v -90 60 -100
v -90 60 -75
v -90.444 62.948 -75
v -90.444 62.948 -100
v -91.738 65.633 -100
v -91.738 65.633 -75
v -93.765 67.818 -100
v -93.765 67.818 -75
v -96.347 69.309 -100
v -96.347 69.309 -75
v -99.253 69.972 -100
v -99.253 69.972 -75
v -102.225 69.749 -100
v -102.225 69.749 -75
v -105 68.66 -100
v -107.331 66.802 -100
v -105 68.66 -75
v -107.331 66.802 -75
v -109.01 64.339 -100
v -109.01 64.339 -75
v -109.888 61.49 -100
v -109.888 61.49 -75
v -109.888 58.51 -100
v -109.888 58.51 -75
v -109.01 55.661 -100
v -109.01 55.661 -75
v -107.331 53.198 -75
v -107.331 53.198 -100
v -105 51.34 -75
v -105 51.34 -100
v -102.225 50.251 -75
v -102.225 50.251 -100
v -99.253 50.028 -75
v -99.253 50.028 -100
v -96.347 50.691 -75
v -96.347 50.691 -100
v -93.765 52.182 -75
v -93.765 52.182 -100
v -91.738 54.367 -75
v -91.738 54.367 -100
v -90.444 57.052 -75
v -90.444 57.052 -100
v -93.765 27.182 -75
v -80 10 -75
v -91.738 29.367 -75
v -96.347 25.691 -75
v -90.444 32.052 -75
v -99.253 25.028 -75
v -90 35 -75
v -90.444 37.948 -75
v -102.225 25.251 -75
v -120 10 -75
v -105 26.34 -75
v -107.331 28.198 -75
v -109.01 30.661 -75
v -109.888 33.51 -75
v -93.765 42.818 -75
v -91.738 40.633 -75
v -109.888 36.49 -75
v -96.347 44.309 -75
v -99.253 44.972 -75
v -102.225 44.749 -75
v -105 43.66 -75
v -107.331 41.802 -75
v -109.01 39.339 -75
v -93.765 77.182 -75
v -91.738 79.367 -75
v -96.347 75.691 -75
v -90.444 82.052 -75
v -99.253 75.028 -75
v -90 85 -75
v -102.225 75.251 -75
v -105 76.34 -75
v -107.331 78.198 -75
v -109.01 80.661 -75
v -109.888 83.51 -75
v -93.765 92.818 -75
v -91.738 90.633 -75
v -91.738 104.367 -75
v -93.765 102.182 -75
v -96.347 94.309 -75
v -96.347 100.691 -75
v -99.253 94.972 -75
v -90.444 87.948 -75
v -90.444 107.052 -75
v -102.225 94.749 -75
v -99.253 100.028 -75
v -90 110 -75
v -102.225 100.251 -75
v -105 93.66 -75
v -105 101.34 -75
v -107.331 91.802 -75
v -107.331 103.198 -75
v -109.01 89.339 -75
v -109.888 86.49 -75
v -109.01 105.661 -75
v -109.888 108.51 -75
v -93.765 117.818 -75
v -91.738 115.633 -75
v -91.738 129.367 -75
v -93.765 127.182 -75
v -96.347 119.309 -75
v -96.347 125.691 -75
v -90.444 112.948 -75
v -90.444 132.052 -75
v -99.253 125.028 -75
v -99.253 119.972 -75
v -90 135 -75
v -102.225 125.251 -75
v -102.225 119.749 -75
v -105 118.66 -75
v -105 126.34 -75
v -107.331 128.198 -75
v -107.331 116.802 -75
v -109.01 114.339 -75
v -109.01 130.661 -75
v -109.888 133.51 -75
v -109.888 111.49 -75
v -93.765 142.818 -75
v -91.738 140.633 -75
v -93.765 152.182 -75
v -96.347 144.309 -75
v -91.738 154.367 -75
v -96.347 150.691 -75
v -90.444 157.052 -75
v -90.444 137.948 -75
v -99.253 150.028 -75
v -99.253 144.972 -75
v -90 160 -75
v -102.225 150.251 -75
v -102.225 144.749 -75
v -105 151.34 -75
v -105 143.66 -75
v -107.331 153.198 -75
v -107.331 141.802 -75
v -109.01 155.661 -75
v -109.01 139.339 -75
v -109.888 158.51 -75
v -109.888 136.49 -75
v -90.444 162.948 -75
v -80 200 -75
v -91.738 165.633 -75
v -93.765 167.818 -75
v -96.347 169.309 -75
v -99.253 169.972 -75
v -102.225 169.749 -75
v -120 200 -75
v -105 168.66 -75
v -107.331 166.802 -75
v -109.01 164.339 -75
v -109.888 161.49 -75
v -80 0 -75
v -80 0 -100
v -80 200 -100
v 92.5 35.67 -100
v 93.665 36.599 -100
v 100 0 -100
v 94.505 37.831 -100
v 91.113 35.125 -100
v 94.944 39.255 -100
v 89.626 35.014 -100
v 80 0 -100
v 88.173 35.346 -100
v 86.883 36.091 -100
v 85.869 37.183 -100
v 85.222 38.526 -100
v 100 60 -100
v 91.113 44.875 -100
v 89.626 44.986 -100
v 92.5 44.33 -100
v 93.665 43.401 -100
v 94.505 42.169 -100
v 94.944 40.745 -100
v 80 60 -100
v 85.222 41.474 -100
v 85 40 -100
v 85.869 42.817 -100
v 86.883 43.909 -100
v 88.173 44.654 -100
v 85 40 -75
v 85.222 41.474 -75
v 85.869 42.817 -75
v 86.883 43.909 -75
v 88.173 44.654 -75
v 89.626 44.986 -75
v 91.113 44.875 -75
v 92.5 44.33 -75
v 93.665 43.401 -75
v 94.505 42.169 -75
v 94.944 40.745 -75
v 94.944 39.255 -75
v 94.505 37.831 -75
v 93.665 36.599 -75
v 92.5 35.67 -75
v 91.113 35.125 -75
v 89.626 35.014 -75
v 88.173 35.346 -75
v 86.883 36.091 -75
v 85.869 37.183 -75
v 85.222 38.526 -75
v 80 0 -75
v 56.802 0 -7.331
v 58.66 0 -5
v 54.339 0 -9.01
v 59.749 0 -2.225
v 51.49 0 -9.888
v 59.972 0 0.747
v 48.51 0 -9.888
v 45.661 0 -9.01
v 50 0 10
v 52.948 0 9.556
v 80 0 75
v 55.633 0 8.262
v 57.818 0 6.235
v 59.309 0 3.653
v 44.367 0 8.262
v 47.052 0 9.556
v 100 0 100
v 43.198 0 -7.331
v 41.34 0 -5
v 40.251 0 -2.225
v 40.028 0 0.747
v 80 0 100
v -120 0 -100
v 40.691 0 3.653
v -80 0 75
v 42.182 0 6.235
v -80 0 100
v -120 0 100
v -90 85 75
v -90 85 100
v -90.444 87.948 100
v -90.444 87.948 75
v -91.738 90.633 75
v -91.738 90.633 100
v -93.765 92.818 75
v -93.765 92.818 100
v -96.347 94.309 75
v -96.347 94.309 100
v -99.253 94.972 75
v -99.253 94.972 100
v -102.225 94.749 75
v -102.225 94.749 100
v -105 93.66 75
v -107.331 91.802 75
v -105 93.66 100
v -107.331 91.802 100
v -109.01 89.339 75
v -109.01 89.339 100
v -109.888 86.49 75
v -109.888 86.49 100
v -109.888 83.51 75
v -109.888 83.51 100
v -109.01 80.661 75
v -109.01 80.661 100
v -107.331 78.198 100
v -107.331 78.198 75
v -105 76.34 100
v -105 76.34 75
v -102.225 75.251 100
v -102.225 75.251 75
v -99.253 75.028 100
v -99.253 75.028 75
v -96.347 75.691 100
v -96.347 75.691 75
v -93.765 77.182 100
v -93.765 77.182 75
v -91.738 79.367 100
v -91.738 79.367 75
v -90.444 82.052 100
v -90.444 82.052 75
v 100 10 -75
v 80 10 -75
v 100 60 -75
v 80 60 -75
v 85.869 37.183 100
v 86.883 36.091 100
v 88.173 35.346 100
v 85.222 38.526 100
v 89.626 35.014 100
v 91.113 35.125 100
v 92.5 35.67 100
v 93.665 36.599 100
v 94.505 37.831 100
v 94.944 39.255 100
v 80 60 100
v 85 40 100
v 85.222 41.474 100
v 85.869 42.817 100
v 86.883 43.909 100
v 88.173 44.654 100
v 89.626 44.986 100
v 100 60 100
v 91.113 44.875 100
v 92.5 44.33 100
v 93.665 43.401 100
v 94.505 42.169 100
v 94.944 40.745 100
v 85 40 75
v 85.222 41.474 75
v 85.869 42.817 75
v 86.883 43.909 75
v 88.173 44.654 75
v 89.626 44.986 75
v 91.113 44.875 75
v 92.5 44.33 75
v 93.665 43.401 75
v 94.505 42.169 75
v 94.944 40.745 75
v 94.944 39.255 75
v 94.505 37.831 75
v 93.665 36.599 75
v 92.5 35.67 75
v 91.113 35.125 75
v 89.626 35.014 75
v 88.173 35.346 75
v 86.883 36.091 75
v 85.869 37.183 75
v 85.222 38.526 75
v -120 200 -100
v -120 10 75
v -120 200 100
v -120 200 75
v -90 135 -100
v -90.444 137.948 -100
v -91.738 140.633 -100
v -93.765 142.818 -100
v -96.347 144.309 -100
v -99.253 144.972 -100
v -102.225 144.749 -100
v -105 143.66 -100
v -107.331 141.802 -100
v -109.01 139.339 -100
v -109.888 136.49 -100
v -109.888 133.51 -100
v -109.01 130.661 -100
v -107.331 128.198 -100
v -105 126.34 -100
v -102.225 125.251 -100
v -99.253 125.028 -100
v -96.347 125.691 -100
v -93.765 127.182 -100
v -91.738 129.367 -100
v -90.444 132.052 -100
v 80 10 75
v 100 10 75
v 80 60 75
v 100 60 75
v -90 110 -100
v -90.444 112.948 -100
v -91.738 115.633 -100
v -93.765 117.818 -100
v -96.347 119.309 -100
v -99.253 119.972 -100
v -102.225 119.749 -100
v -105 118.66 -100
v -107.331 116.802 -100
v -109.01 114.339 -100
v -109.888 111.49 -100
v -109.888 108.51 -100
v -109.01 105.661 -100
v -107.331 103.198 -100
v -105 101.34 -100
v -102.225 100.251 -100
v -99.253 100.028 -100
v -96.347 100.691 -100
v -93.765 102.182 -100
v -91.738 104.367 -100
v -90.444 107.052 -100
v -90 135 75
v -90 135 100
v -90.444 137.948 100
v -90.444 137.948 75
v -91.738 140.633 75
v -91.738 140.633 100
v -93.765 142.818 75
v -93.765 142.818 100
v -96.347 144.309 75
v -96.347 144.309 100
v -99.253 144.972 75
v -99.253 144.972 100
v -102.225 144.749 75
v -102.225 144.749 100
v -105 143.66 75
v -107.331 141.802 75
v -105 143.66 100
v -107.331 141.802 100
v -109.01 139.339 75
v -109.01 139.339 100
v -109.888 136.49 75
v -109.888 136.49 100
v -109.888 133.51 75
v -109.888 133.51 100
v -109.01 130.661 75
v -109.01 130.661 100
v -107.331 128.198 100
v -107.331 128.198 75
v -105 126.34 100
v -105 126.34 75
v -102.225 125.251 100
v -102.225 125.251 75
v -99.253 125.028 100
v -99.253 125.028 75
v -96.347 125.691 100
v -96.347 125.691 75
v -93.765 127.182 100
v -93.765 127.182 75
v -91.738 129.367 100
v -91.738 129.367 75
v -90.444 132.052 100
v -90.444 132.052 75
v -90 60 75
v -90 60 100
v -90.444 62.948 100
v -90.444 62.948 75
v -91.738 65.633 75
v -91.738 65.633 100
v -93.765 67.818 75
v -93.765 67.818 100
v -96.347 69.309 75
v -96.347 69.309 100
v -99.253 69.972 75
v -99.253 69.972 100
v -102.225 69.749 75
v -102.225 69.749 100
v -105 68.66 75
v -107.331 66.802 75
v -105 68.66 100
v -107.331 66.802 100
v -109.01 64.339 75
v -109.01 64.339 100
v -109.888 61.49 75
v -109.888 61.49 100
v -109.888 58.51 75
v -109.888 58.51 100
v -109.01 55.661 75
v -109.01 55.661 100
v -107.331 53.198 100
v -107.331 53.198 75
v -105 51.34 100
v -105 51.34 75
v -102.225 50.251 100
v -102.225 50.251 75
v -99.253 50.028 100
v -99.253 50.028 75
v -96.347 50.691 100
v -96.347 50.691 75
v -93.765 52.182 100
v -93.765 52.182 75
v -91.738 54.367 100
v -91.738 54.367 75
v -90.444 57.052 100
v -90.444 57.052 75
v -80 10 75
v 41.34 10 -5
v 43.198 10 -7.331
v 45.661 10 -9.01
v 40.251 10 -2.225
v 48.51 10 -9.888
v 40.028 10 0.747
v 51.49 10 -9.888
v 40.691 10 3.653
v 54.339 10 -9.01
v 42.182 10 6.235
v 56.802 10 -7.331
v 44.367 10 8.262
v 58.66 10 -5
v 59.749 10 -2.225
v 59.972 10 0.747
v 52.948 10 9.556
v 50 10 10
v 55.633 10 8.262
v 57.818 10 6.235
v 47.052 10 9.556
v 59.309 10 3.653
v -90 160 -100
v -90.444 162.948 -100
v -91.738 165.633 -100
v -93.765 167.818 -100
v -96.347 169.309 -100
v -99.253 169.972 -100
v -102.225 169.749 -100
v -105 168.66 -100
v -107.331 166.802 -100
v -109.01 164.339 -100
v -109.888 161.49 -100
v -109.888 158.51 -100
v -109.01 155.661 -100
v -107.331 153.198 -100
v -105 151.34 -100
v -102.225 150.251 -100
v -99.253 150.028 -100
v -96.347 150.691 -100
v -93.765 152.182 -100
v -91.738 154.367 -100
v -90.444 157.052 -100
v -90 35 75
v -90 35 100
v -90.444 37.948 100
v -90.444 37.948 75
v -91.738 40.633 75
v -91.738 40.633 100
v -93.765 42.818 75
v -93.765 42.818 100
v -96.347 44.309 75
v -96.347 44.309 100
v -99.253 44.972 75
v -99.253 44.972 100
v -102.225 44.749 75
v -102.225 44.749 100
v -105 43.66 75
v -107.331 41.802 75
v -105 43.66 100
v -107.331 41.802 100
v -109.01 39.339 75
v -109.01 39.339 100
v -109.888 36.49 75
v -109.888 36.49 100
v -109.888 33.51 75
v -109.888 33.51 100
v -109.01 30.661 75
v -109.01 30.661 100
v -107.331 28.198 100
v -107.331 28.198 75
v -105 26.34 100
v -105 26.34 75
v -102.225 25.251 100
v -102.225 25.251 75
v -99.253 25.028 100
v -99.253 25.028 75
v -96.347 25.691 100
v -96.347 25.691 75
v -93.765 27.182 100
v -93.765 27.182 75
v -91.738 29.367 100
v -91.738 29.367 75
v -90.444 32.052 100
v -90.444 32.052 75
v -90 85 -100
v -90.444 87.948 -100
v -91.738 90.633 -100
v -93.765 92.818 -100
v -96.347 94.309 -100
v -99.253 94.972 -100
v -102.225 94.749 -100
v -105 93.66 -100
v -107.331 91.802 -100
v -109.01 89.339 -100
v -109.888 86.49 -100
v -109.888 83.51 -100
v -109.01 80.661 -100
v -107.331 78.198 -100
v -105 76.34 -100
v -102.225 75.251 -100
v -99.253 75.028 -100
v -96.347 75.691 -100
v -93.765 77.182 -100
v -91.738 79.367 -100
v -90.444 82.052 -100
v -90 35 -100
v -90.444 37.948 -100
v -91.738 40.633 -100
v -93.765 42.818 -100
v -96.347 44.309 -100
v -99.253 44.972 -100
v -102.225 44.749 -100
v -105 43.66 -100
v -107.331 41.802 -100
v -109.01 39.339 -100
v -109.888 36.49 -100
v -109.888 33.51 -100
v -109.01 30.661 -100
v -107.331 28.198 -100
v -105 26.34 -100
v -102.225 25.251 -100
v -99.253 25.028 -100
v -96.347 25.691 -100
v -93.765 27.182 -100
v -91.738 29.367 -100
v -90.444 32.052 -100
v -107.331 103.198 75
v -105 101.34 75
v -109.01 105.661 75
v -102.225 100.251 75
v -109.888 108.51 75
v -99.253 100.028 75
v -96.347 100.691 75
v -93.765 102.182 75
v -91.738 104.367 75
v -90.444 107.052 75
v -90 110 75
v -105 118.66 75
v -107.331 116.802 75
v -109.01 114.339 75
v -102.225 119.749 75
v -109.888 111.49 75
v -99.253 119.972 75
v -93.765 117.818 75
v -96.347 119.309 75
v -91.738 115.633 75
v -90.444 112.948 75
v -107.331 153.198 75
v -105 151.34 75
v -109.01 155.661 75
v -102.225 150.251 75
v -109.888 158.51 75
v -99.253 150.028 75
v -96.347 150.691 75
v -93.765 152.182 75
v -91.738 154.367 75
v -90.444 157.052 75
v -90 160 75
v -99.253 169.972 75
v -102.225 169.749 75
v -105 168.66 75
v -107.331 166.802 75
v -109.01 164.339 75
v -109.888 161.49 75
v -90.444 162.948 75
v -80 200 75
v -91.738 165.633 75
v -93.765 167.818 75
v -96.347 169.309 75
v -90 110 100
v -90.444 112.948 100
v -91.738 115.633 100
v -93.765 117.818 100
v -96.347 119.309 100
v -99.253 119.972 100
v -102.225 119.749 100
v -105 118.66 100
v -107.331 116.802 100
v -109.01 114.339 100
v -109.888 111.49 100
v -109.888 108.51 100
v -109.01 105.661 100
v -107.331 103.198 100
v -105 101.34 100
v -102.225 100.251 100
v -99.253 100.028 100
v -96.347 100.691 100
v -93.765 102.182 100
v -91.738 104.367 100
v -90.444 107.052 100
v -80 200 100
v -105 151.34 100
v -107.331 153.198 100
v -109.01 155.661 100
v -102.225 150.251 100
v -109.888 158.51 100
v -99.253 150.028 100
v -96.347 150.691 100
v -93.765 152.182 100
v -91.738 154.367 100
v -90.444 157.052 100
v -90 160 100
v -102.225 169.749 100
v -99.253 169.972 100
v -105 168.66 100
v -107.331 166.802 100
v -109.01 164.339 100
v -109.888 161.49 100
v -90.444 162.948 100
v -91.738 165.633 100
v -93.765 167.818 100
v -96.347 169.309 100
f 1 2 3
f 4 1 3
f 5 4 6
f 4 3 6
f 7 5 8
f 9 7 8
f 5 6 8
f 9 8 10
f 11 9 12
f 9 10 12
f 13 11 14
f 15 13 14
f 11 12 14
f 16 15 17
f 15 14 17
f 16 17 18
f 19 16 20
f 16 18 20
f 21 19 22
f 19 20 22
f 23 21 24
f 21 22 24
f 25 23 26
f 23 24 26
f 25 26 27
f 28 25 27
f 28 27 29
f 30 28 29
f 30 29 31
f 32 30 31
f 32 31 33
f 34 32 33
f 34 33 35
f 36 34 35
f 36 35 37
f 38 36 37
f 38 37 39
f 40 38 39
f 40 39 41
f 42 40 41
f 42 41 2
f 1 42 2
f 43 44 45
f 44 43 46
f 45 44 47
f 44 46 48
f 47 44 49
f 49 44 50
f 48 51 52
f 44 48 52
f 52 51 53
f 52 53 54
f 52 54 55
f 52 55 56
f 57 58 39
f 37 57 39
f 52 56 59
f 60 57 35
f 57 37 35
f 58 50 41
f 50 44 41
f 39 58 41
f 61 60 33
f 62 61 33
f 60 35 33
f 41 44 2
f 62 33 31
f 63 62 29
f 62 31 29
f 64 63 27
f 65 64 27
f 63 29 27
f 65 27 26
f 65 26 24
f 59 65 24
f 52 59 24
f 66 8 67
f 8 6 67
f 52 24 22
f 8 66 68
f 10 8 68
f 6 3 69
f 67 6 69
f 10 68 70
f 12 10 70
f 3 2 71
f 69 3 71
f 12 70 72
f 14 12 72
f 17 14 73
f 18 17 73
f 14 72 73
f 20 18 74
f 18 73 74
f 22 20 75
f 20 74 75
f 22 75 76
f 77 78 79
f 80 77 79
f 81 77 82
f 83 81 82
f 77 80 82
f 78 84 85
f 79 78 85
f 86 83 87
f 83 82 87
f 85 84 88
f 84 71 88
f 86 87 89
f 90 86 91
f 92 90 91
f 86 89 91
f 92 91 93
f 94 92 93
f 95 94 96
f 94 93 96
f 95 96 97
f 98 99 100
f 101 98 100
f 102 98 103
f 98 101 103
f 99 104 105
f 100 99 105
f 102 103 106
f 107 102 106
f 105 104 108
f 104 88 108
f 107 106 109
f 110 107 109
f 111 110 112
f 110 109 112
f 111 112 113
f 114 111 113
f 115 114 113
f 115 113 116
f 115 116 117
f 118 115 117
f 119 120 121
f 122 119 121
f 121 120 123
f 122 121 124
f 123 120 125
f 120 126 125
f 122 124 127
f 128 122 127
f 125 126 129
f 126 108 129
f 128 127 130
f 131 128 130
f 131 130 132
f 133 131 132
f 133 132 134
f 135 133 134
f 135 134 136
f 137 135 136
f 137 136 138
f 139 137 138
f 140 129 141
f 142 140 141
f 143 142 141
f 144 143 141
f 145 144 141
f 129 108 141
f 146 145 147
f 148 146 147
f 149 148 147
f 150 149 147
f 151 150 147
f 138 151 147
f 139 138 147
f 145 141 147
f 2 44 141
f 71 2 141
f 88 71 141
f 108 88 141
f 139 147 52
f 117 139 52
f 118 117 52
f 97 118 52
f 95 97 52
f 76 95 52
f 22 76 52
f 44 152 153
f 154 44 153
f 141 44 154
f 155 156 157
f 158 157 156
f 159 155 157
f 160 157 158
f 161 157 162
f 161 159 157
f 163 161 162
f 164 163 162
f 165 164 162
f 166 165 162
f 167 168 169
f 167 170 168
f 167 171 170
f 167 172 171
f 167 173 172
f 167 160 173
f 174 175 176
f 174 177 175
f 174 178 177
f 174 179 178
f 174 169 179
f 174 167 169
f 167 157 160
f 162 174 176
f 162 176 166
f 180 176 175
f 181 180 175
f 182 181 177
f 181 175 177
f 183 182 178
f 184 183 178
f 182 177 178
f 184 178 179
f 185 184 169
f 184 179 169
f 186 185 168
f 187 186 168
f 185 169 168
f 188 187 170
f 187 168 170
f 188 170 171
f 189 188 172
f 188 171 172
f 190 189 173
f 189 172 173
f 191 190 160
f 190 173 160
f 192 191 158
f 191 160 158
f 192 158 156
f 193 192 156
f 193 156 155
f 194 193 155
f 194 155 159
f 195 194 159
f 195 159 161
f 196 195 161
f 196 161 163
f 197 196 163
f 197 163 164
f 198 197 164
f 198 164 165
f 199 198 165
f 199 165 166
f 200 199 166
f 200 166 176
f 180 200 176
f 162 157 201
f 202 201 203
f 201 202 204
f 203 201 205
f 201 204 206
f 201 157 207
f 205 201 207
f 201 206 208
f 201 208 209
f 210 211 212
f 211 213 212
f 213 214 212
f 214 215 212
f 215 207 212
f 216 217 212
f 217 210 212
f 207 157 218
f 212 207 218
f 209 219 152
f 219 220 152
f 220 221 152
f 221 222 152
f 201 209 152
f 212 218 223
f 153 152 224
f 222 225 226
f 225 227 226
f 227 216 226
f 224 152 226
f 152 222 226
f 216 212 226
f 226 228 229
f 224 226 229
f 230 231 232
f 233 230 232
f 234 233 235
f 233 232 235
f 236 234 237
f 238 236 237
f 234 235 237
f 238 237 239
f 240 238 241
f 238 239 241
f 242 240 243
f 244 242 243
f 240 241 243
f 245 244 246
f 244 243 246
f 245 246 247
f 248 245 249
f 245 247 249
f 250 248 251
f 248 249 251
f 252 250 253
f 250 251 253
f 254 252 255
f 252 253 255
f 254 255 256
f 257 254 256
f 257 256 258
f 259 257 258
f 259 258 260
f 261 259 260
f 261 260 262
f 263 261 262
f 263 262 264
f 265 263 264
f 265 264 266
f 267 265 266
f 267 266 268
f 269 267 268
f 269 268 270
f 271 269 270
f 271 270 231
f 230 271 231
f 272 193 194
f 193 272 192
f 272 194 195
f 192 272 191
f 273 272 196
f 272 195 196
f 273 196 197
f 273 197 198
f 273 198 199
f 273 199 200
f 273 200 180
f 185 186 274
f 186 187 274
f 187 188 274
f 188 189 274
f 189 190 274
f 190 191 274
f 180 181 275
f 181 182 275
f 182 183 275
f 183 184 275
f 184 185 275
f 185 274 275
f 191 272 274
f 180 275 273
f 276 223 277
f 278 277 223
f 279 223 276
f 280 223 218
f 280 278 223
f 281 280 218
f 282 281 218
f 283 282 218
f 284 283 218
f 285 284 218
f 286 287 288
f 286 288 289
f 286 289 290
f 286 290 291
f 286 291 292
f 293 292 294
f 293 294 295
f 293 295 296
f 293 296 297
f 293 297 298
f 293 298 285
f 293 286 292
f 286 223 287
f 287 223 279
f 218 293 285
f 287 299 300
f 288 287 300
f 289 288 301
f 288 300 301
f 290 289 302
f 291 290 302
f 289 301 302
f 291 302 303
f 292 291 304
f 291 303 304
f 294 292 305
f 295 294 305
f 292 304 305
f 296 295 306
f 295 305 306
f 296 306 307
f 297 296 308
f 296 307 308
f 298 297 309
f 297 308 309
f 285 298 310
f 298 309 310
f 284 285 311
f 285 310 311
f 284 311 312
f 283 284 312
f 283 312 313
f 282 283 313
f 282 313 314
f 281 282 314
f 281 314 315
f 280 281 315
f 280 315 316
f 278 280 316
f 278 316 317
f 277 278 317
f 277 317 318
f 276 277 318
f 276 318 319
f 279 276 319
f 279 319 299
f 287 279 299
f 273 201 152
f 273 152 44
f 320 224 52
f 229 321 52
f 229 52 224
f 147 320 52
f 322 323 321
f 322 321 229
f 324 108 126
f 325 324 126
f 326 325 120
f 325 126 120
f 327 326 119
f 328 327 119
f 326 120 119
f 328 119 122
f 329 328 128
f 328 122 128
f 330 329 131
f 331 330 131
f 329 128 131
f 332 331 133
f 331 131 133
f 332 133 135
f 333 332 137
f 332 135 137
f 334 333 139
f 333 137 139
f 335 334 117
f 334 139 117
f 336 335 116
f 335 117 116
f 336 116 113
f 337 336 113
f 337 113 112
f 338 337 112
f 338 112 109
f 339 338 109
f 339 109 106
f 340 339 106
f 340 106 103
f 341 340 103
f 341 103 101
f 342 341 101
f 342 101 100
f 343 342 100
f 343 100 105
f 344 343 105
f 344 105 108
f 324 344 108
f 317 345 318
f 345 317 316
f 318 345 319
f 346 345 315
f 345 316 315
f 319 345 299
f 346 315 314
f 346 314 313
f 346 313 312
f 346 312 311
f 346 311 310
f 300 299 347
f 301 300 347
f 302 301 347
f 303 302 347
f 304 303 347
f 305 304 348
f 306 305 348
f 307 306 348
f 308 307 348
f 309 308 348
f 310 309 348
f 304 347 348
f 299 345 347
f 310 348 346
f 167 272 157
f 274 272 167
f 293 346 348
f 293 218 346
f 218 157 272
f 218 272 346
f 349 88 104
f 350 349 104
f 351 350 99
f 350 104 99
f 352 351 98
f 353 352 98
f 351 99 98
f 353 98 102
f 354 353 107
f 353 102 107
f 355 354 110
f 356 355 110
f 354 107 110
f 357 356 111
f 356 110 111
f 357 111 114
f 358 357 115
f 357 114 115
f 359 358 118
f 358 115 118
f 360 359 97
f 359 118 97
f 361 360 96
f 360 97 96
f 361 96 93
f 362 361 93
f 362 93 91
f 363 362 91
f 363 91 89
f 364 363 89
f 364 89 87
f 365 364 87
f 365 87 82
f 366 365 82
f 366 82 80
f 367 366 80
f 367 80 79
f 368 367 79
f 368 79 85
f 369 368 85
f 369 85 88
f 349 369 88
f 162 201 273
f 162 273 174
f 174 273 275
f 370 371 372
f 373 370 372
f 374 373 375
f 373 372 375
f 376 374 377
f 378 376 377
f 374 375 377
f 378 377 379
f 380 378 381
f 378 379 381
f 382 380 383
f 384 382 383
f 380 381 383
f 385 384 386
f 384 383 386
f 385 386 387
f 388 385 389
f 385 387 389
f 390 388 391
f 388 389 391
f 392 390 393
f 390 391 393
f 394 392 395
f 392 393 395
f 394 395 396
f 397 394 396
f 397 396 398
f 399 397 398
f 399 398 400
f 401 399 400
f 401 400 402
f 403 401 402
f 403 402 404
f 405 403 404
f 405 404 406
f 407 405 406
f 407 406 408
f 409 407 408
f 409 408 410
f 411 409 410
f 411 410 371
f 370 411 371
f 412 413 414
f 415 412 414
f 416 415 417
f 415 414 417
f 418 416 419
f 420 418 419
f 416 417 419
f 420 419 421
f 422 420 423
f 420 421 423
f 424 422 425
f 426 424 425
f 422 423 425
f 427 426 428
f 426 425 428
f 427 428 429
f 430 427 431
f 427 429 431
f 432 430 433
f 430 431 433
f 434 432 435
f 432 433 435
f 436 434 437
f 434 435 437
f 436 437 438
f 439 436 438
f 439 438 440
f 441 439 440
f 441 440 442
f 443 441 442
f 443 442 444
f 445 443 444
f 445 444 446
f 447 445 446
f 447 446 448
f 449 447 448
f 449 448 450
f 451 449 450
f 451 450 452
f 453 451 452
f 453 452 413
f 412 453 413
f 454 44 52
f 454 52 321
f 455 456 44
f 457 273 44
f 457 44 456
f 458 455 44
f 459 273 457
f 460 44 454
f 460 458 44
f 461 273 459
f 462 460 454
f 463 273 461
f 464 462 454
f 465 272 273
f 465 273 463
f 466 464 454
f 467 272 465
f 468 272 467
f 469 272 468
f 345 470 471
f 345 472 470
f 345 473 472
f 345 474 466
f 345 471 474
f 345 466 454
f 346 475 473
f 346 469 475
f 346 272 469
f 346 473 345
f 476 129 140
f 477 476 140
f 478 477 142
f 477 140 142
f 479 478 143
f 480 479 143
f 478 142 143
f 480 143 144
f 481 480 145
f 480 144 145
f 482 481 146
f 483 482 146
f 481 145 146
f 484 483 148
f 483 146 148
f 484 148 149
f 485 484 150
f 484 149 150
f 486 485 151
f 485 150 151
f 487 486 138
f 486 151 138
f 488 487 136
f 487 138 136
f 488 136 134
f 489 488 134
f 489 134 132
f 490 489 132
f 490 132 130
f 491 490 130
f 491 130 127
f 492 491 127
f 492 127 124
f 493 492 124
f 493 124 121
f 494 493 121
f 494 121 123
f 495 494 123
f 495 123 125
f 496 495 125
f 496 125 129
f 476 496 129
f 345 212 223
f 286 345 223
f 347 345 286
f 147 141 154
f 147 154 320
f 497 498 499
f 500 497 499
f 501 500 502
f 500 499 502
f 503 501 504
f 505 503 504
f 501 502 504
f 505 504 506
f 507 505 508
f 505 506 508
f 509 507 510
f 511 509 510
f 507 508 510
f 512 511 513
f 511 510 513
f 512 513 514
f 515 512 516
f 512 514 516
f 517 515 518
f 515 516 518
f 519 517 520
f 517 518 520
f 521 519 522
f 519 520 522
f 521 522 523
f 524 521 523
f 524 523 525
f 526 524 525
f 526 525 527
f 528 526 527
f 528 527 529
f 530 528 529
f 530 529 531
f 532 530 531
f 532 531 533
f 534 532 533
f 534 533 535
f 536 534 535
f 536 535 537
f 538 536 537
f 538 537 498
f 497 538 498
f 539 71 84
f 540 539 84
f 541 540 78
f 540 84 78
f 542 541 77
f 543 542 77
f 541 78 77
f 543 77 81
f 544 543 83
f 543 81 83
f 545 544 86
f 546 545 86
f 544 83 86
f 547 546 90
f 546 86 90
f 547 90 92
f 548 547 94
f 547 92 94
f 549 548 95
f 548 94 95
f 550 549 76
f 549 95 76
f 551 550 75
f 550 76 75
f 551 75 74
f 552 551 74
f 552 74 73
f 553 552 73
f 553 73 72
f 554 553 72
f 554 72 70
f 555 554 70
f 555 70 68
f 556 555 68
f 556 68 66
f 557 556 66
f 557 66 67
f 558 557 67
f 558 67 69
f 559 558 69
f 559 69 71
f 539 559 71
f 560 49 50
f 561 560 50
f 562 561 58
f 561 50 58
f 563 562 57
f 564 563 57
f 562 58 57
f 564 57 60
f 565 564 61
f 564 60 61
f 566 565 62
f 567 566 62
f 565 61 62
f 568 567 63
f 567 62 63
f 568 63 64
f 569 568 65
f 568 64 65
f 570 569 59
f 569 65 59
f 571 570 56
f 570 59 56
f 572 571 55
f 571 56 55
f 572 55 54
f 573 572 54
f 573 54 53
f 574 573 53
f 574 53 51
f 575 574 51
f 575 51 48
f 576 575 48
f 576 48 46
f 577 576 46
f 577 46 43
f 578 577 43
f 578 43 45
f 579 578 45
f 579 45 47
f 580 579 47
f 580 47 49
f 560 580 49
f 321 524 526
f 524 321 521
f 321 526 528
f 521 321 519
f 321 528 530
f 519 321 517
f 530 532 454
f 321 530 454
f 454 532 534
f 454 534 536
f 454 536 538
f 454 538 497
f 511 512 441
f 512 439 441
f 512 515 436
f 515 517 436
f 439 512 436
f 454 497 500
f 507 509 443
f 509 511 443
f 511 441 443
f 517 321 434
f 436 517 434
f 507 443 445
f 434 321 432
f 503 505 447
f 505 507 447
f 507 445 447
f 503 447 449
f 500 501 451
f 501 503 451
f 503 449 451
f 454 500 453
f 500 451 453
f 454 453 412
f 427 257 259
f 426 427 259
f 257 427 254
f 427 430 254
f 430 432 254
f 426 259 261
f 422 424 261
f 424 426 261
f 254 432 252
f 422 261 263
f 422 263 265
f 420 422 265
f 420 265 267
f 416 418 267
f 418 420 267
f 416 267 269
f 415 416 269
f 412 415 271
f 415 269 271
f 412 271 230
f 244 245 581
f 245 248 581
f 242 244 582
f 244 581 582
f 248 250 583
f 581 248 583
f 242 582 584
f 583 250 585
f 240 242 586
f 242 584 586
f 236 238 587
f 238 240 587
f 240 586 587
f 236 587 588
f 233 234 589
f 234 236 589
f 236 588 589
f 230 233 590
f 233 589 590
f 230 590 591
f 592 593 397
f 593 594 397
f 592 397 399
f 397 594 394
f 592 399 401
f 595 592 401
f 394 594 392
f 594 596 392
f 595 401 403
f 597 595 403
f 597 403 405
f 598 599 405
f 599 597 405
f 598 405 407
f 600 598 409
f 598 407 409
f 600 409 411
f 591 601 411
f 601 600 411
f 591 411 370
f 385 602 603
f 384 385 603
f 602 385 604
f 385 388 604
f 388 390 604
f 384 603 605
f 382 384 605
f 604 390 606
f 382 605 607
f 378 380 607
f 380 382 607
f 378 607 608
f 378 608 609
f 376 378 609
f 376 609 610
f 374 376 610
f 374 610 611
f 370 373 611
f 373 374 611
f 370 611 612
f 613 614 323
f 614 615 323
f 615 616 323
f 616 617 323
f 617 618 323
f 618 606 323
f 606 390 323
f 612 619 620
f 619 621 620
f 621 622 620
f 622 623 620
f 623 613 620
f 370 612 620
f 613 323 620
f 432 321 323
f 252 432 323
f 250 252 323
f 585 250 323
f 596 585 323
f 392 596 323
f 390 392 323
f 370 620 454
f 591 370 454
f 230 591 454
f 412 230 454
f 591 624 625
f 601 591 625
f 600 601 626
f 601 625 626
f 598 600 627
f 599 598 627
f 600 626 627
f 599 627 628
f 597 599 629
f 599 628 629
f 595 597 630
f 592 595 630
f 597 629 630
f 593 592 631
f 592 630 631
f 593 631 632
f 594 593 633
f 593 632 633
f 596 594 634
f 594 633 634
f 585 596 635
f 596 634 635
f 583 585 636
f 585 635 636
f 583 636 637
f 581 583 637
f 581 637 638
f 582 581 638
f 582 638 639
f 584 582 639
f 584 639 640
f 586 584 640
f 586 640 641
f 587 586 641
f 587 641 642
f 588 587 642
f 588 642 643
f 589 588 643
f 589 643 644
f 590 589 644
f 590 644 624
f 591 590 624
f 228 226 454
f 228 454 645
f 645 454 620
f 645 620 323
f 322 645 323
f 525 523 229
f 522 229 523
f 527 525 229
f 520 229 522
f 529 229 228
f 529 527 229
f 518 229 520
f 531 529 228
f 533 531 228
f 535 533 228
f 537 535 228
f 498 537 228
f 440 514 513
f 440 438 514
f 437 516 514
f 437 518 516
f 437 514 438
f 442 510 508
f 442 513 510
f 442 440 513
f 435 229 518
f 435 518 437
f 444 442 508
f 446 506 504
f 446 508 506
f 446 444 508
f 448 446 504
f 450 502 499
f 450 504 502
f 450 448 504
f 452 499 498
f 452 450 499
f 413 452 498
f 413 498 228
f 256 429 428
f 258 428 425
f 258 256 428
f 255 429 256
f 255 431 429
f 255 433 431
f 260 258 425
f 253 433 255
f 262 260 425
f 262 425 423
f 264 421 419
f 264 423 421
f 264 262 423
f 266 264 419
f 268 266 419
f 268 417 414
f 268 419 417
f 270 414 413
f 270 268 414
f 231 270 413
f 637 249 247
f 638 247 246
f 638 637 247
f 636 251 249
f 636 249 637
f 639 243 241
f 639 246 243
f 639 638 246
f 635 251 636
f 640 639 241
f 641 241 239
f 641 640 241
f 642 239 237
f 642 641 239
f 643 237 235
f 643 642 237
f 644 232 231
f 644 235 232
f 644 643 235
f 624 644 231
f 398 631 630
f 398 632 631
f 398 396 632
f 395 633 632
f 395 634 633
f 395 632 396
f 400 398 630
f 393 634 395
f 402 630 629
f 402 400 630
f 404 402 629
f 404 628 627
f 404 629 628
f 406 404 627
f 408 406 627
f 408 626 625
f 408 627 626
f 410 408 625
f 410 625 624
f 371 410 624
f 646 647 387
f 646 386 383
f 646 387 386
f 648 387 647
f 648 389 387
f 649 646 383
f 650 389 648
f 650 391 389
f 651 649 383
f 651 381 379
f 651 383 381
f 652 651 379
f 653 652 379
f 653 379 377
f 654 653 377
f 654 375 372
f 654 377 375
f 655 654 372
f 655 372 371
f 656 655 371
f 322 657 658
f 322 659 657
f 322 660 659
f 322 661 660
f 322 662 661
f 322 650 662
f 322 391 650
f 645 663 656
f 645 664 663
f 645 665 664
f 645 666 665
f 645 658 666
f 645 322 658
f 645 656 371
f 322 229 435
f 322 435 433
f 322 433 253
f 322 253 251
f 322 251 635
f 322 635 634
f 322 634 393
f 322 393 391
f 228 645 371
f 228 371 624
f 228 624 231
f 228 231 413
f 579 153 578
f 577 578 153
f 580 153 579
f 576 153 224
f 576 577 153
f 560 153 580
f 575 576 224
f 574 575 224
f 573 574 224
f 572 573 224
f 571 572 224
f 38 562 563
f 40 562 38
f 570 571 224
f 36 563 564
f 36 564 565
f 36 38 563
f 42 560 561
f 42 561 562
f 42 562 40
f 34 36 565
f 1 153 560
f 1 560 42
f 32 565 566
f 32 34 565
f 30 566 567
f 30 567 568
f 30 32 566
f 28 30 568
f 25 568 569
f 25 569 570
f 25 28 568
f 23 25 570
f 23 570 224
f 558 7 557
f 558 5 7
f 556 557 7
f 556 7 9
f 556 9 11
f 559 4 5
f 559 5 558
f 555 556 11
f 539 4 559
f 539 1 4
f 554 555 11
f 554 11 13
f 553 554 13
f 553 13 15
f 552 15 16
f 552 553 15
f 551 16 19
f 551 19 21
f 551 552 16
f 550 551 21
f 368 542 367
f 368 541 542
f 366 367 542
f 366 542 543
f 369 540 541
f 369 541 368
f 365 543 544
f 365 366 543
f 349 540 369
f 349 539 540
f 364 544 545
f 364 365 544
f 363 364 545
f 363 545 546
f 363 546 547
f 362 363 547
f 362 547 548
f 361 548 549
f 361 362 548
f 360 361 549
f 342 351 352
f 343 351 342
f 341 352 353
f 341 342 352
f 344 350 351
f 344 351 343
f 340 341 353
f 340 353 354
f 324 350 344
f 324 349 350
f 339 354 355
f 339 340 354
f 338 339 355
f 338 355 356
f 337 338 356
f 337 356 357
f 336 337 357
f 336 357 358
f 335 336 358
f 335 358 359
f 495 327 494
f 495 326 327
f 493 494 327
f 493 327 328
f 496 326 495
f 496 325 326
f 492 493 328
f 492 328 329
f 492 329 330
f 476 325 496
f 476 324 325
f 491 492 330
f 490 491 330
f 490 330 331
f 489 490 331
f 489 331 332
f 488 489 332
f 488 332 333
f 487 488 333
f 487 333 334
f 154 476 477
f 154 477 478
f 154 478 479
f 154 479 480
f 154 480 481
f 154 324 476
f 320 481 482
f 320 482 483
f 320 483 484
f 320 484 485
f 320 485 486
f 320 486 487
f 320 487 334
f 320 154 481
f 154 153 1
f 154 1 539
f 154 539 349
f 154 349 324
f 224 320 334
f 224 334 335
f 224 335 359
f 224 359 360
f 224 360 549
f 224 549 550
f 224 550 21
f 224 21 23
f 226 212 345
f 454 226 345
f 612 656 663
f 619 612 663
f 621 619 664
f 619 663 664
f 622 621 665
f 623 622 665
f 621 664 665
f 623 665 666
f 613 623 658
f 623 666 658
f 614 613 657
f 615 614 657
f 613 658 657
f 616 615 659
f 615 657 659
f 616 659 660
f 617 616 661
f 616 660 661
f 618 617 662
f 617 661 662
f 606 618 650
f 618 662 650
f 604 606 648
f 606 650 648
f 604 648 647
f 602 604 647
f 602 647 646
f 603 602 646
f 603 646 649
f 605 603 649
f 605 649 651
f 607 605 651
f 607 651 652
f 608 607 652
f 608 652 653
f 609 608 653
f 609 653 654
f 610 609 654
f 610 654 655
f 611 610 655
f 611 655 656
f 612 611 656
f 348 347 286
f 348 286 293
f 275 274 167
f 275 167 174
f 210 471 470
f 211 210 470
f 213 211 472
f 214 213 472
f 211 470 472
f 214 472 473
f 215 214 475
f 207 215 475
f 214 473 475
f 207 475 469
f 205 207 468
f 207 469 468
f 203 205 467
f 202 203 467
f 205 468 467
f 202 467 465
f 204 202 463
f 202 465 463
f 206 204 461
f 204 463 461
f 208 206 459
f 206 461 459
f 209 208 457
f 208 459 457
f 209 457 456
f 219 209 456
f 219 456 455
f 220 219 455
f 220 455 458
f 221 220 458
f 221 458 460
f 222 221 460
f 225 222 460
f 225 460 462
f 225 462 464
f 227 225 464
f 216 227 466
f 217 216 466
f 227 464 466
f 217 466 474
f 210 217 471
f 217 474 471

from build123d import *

# Parameters (mm, degrees)
SKETCH1_W           = 200
SKETCH1_H           = 150
BOSS_EXTRUDE1_DEPTH = 10
SKETCH2_R           = 10
CUT_EXTRUDE1_DEPTH  = 10
SKETCH4_W           = 150
SKETCH4_H           = 10
BOSS_EXTRUDE2_DEPTH = 20
SKETCH3_W           = 20
SKETCH3_H           = 60
BOSS_EXTRUDE3_DEPTH = 25
SKETCH5_W           = 20
SKETCH5_H           = 60
SKETCH5_W_2         = 40
SKETCH5_H_2         = 200
BOSS_EXTRUDE4_DEPTH = 25
SKETCH7_R           = 5
CUT_EXTRUDE3_DEPTH  = 251
SKETCH9_R           = 10
CUT_EXTRUDE4_DEPTH  = 241


with BuildPart() as part:
    # Sketch1 → Boss-Extrude1 (new body)
    with BuildSketch(Plane(origin=(0, 0, 0), x_dir=(1, 0, 0), z_dir=(0, 1, 0))):
        Rectangle(SKETCH1_W, SKETCH1_H)
    extrude(amount=BOSS_EXTRUDE1_DEPTH)

    # Sketch2 → Cut-Extrude1 (cut)
    with BuildSketch(Plane(origin=(0, 10, 0), x_dir=(1, 0, 0), z_dir=(0, 1, 0))):
        with Locations(Location((50, 0, 0), (0, 0, 270))):
            Circle(SKETCH2_R)
    extrude(amount=-CUT_EXTRUDE1_DEPTH, mode=Mode.SUBTRACT)

    # Sketch4 → Boss-Extrude2 (add)
    with BuildSketch(Plane.ZY.offset(100)):
        with Locations((0, 5)):
            Rectangle(SKETCH4_W, SKETCH4_H)
    extrude(amount=BOSS_EXTRUDE2_DEPTH)

    # Sketch3 → Boss-Extrude3 (add)
    with BuildSketch(Plane.XY.offset(75)):
        with Locations((90, 30)):
            Rectangle(SKETCH3_W, SKETCH3_H)
        Polygon((-100, 200), (-120, 200), (-120, 0), (-100, 0), (-80, 0), (-80, 200), align=None)
    extrude(amount=BOSS_EXTRUDE3_DEPTH)

    # Sketch5 → Boss-Extrude4 (add)
    with BuildSketch(Plane(origin=(0, 0, -75), x_dir=(-1, 0, 0), z_dir=(0, 0, -1))):
        with Locations((-90, 30)):
            Rectangle(SKETCH5_W, SKETCH5_H)
        with Locations((100, 100)):
            Rectangle(SKETCH5_W_2, SKETCH5_H_2)
    extrude(amount=BOSS_EXTRUDE4_DEPTH)

    # Sketch7 → Cut-Extrude3 (cut)
    with BuildSketch(Plane(origin=(0, 0, -100), x_dir=(-1, 0, 0), z_dir=(0, 0, -1))):
        with Locations((-90, 40)):
            Circle(SKETCH7_R)
    extrude(amount=-CUT_EXTRUDE3_DEPTH, mode=Mode.SUBTRACT)

    # Sketch9 → Cut-Extrude4 (cut)
    with BuildSketch(Plane.XY.offset(100)):
        with Locations((-100, 160)):
            Circle(SKETCH9_R)
        with Locations((-100, 135)):
            Circle(SKETCH9_R)
        with Locations((-100, 110)):
            Circle(SKETCH9_R)
        with Locations((-100, 85)):
            Circle(SKETCH9_R)
        with Locations((-100, 35)):
            Circle(SKETCH9_R)
        with Locations((-100, 60)):
            Circle(SKETCH9_R)
    extrude(amount=-CUT_EXTRUDE4_DEPTH, mode=Mode.SUBTRACT)


solid = part.part
